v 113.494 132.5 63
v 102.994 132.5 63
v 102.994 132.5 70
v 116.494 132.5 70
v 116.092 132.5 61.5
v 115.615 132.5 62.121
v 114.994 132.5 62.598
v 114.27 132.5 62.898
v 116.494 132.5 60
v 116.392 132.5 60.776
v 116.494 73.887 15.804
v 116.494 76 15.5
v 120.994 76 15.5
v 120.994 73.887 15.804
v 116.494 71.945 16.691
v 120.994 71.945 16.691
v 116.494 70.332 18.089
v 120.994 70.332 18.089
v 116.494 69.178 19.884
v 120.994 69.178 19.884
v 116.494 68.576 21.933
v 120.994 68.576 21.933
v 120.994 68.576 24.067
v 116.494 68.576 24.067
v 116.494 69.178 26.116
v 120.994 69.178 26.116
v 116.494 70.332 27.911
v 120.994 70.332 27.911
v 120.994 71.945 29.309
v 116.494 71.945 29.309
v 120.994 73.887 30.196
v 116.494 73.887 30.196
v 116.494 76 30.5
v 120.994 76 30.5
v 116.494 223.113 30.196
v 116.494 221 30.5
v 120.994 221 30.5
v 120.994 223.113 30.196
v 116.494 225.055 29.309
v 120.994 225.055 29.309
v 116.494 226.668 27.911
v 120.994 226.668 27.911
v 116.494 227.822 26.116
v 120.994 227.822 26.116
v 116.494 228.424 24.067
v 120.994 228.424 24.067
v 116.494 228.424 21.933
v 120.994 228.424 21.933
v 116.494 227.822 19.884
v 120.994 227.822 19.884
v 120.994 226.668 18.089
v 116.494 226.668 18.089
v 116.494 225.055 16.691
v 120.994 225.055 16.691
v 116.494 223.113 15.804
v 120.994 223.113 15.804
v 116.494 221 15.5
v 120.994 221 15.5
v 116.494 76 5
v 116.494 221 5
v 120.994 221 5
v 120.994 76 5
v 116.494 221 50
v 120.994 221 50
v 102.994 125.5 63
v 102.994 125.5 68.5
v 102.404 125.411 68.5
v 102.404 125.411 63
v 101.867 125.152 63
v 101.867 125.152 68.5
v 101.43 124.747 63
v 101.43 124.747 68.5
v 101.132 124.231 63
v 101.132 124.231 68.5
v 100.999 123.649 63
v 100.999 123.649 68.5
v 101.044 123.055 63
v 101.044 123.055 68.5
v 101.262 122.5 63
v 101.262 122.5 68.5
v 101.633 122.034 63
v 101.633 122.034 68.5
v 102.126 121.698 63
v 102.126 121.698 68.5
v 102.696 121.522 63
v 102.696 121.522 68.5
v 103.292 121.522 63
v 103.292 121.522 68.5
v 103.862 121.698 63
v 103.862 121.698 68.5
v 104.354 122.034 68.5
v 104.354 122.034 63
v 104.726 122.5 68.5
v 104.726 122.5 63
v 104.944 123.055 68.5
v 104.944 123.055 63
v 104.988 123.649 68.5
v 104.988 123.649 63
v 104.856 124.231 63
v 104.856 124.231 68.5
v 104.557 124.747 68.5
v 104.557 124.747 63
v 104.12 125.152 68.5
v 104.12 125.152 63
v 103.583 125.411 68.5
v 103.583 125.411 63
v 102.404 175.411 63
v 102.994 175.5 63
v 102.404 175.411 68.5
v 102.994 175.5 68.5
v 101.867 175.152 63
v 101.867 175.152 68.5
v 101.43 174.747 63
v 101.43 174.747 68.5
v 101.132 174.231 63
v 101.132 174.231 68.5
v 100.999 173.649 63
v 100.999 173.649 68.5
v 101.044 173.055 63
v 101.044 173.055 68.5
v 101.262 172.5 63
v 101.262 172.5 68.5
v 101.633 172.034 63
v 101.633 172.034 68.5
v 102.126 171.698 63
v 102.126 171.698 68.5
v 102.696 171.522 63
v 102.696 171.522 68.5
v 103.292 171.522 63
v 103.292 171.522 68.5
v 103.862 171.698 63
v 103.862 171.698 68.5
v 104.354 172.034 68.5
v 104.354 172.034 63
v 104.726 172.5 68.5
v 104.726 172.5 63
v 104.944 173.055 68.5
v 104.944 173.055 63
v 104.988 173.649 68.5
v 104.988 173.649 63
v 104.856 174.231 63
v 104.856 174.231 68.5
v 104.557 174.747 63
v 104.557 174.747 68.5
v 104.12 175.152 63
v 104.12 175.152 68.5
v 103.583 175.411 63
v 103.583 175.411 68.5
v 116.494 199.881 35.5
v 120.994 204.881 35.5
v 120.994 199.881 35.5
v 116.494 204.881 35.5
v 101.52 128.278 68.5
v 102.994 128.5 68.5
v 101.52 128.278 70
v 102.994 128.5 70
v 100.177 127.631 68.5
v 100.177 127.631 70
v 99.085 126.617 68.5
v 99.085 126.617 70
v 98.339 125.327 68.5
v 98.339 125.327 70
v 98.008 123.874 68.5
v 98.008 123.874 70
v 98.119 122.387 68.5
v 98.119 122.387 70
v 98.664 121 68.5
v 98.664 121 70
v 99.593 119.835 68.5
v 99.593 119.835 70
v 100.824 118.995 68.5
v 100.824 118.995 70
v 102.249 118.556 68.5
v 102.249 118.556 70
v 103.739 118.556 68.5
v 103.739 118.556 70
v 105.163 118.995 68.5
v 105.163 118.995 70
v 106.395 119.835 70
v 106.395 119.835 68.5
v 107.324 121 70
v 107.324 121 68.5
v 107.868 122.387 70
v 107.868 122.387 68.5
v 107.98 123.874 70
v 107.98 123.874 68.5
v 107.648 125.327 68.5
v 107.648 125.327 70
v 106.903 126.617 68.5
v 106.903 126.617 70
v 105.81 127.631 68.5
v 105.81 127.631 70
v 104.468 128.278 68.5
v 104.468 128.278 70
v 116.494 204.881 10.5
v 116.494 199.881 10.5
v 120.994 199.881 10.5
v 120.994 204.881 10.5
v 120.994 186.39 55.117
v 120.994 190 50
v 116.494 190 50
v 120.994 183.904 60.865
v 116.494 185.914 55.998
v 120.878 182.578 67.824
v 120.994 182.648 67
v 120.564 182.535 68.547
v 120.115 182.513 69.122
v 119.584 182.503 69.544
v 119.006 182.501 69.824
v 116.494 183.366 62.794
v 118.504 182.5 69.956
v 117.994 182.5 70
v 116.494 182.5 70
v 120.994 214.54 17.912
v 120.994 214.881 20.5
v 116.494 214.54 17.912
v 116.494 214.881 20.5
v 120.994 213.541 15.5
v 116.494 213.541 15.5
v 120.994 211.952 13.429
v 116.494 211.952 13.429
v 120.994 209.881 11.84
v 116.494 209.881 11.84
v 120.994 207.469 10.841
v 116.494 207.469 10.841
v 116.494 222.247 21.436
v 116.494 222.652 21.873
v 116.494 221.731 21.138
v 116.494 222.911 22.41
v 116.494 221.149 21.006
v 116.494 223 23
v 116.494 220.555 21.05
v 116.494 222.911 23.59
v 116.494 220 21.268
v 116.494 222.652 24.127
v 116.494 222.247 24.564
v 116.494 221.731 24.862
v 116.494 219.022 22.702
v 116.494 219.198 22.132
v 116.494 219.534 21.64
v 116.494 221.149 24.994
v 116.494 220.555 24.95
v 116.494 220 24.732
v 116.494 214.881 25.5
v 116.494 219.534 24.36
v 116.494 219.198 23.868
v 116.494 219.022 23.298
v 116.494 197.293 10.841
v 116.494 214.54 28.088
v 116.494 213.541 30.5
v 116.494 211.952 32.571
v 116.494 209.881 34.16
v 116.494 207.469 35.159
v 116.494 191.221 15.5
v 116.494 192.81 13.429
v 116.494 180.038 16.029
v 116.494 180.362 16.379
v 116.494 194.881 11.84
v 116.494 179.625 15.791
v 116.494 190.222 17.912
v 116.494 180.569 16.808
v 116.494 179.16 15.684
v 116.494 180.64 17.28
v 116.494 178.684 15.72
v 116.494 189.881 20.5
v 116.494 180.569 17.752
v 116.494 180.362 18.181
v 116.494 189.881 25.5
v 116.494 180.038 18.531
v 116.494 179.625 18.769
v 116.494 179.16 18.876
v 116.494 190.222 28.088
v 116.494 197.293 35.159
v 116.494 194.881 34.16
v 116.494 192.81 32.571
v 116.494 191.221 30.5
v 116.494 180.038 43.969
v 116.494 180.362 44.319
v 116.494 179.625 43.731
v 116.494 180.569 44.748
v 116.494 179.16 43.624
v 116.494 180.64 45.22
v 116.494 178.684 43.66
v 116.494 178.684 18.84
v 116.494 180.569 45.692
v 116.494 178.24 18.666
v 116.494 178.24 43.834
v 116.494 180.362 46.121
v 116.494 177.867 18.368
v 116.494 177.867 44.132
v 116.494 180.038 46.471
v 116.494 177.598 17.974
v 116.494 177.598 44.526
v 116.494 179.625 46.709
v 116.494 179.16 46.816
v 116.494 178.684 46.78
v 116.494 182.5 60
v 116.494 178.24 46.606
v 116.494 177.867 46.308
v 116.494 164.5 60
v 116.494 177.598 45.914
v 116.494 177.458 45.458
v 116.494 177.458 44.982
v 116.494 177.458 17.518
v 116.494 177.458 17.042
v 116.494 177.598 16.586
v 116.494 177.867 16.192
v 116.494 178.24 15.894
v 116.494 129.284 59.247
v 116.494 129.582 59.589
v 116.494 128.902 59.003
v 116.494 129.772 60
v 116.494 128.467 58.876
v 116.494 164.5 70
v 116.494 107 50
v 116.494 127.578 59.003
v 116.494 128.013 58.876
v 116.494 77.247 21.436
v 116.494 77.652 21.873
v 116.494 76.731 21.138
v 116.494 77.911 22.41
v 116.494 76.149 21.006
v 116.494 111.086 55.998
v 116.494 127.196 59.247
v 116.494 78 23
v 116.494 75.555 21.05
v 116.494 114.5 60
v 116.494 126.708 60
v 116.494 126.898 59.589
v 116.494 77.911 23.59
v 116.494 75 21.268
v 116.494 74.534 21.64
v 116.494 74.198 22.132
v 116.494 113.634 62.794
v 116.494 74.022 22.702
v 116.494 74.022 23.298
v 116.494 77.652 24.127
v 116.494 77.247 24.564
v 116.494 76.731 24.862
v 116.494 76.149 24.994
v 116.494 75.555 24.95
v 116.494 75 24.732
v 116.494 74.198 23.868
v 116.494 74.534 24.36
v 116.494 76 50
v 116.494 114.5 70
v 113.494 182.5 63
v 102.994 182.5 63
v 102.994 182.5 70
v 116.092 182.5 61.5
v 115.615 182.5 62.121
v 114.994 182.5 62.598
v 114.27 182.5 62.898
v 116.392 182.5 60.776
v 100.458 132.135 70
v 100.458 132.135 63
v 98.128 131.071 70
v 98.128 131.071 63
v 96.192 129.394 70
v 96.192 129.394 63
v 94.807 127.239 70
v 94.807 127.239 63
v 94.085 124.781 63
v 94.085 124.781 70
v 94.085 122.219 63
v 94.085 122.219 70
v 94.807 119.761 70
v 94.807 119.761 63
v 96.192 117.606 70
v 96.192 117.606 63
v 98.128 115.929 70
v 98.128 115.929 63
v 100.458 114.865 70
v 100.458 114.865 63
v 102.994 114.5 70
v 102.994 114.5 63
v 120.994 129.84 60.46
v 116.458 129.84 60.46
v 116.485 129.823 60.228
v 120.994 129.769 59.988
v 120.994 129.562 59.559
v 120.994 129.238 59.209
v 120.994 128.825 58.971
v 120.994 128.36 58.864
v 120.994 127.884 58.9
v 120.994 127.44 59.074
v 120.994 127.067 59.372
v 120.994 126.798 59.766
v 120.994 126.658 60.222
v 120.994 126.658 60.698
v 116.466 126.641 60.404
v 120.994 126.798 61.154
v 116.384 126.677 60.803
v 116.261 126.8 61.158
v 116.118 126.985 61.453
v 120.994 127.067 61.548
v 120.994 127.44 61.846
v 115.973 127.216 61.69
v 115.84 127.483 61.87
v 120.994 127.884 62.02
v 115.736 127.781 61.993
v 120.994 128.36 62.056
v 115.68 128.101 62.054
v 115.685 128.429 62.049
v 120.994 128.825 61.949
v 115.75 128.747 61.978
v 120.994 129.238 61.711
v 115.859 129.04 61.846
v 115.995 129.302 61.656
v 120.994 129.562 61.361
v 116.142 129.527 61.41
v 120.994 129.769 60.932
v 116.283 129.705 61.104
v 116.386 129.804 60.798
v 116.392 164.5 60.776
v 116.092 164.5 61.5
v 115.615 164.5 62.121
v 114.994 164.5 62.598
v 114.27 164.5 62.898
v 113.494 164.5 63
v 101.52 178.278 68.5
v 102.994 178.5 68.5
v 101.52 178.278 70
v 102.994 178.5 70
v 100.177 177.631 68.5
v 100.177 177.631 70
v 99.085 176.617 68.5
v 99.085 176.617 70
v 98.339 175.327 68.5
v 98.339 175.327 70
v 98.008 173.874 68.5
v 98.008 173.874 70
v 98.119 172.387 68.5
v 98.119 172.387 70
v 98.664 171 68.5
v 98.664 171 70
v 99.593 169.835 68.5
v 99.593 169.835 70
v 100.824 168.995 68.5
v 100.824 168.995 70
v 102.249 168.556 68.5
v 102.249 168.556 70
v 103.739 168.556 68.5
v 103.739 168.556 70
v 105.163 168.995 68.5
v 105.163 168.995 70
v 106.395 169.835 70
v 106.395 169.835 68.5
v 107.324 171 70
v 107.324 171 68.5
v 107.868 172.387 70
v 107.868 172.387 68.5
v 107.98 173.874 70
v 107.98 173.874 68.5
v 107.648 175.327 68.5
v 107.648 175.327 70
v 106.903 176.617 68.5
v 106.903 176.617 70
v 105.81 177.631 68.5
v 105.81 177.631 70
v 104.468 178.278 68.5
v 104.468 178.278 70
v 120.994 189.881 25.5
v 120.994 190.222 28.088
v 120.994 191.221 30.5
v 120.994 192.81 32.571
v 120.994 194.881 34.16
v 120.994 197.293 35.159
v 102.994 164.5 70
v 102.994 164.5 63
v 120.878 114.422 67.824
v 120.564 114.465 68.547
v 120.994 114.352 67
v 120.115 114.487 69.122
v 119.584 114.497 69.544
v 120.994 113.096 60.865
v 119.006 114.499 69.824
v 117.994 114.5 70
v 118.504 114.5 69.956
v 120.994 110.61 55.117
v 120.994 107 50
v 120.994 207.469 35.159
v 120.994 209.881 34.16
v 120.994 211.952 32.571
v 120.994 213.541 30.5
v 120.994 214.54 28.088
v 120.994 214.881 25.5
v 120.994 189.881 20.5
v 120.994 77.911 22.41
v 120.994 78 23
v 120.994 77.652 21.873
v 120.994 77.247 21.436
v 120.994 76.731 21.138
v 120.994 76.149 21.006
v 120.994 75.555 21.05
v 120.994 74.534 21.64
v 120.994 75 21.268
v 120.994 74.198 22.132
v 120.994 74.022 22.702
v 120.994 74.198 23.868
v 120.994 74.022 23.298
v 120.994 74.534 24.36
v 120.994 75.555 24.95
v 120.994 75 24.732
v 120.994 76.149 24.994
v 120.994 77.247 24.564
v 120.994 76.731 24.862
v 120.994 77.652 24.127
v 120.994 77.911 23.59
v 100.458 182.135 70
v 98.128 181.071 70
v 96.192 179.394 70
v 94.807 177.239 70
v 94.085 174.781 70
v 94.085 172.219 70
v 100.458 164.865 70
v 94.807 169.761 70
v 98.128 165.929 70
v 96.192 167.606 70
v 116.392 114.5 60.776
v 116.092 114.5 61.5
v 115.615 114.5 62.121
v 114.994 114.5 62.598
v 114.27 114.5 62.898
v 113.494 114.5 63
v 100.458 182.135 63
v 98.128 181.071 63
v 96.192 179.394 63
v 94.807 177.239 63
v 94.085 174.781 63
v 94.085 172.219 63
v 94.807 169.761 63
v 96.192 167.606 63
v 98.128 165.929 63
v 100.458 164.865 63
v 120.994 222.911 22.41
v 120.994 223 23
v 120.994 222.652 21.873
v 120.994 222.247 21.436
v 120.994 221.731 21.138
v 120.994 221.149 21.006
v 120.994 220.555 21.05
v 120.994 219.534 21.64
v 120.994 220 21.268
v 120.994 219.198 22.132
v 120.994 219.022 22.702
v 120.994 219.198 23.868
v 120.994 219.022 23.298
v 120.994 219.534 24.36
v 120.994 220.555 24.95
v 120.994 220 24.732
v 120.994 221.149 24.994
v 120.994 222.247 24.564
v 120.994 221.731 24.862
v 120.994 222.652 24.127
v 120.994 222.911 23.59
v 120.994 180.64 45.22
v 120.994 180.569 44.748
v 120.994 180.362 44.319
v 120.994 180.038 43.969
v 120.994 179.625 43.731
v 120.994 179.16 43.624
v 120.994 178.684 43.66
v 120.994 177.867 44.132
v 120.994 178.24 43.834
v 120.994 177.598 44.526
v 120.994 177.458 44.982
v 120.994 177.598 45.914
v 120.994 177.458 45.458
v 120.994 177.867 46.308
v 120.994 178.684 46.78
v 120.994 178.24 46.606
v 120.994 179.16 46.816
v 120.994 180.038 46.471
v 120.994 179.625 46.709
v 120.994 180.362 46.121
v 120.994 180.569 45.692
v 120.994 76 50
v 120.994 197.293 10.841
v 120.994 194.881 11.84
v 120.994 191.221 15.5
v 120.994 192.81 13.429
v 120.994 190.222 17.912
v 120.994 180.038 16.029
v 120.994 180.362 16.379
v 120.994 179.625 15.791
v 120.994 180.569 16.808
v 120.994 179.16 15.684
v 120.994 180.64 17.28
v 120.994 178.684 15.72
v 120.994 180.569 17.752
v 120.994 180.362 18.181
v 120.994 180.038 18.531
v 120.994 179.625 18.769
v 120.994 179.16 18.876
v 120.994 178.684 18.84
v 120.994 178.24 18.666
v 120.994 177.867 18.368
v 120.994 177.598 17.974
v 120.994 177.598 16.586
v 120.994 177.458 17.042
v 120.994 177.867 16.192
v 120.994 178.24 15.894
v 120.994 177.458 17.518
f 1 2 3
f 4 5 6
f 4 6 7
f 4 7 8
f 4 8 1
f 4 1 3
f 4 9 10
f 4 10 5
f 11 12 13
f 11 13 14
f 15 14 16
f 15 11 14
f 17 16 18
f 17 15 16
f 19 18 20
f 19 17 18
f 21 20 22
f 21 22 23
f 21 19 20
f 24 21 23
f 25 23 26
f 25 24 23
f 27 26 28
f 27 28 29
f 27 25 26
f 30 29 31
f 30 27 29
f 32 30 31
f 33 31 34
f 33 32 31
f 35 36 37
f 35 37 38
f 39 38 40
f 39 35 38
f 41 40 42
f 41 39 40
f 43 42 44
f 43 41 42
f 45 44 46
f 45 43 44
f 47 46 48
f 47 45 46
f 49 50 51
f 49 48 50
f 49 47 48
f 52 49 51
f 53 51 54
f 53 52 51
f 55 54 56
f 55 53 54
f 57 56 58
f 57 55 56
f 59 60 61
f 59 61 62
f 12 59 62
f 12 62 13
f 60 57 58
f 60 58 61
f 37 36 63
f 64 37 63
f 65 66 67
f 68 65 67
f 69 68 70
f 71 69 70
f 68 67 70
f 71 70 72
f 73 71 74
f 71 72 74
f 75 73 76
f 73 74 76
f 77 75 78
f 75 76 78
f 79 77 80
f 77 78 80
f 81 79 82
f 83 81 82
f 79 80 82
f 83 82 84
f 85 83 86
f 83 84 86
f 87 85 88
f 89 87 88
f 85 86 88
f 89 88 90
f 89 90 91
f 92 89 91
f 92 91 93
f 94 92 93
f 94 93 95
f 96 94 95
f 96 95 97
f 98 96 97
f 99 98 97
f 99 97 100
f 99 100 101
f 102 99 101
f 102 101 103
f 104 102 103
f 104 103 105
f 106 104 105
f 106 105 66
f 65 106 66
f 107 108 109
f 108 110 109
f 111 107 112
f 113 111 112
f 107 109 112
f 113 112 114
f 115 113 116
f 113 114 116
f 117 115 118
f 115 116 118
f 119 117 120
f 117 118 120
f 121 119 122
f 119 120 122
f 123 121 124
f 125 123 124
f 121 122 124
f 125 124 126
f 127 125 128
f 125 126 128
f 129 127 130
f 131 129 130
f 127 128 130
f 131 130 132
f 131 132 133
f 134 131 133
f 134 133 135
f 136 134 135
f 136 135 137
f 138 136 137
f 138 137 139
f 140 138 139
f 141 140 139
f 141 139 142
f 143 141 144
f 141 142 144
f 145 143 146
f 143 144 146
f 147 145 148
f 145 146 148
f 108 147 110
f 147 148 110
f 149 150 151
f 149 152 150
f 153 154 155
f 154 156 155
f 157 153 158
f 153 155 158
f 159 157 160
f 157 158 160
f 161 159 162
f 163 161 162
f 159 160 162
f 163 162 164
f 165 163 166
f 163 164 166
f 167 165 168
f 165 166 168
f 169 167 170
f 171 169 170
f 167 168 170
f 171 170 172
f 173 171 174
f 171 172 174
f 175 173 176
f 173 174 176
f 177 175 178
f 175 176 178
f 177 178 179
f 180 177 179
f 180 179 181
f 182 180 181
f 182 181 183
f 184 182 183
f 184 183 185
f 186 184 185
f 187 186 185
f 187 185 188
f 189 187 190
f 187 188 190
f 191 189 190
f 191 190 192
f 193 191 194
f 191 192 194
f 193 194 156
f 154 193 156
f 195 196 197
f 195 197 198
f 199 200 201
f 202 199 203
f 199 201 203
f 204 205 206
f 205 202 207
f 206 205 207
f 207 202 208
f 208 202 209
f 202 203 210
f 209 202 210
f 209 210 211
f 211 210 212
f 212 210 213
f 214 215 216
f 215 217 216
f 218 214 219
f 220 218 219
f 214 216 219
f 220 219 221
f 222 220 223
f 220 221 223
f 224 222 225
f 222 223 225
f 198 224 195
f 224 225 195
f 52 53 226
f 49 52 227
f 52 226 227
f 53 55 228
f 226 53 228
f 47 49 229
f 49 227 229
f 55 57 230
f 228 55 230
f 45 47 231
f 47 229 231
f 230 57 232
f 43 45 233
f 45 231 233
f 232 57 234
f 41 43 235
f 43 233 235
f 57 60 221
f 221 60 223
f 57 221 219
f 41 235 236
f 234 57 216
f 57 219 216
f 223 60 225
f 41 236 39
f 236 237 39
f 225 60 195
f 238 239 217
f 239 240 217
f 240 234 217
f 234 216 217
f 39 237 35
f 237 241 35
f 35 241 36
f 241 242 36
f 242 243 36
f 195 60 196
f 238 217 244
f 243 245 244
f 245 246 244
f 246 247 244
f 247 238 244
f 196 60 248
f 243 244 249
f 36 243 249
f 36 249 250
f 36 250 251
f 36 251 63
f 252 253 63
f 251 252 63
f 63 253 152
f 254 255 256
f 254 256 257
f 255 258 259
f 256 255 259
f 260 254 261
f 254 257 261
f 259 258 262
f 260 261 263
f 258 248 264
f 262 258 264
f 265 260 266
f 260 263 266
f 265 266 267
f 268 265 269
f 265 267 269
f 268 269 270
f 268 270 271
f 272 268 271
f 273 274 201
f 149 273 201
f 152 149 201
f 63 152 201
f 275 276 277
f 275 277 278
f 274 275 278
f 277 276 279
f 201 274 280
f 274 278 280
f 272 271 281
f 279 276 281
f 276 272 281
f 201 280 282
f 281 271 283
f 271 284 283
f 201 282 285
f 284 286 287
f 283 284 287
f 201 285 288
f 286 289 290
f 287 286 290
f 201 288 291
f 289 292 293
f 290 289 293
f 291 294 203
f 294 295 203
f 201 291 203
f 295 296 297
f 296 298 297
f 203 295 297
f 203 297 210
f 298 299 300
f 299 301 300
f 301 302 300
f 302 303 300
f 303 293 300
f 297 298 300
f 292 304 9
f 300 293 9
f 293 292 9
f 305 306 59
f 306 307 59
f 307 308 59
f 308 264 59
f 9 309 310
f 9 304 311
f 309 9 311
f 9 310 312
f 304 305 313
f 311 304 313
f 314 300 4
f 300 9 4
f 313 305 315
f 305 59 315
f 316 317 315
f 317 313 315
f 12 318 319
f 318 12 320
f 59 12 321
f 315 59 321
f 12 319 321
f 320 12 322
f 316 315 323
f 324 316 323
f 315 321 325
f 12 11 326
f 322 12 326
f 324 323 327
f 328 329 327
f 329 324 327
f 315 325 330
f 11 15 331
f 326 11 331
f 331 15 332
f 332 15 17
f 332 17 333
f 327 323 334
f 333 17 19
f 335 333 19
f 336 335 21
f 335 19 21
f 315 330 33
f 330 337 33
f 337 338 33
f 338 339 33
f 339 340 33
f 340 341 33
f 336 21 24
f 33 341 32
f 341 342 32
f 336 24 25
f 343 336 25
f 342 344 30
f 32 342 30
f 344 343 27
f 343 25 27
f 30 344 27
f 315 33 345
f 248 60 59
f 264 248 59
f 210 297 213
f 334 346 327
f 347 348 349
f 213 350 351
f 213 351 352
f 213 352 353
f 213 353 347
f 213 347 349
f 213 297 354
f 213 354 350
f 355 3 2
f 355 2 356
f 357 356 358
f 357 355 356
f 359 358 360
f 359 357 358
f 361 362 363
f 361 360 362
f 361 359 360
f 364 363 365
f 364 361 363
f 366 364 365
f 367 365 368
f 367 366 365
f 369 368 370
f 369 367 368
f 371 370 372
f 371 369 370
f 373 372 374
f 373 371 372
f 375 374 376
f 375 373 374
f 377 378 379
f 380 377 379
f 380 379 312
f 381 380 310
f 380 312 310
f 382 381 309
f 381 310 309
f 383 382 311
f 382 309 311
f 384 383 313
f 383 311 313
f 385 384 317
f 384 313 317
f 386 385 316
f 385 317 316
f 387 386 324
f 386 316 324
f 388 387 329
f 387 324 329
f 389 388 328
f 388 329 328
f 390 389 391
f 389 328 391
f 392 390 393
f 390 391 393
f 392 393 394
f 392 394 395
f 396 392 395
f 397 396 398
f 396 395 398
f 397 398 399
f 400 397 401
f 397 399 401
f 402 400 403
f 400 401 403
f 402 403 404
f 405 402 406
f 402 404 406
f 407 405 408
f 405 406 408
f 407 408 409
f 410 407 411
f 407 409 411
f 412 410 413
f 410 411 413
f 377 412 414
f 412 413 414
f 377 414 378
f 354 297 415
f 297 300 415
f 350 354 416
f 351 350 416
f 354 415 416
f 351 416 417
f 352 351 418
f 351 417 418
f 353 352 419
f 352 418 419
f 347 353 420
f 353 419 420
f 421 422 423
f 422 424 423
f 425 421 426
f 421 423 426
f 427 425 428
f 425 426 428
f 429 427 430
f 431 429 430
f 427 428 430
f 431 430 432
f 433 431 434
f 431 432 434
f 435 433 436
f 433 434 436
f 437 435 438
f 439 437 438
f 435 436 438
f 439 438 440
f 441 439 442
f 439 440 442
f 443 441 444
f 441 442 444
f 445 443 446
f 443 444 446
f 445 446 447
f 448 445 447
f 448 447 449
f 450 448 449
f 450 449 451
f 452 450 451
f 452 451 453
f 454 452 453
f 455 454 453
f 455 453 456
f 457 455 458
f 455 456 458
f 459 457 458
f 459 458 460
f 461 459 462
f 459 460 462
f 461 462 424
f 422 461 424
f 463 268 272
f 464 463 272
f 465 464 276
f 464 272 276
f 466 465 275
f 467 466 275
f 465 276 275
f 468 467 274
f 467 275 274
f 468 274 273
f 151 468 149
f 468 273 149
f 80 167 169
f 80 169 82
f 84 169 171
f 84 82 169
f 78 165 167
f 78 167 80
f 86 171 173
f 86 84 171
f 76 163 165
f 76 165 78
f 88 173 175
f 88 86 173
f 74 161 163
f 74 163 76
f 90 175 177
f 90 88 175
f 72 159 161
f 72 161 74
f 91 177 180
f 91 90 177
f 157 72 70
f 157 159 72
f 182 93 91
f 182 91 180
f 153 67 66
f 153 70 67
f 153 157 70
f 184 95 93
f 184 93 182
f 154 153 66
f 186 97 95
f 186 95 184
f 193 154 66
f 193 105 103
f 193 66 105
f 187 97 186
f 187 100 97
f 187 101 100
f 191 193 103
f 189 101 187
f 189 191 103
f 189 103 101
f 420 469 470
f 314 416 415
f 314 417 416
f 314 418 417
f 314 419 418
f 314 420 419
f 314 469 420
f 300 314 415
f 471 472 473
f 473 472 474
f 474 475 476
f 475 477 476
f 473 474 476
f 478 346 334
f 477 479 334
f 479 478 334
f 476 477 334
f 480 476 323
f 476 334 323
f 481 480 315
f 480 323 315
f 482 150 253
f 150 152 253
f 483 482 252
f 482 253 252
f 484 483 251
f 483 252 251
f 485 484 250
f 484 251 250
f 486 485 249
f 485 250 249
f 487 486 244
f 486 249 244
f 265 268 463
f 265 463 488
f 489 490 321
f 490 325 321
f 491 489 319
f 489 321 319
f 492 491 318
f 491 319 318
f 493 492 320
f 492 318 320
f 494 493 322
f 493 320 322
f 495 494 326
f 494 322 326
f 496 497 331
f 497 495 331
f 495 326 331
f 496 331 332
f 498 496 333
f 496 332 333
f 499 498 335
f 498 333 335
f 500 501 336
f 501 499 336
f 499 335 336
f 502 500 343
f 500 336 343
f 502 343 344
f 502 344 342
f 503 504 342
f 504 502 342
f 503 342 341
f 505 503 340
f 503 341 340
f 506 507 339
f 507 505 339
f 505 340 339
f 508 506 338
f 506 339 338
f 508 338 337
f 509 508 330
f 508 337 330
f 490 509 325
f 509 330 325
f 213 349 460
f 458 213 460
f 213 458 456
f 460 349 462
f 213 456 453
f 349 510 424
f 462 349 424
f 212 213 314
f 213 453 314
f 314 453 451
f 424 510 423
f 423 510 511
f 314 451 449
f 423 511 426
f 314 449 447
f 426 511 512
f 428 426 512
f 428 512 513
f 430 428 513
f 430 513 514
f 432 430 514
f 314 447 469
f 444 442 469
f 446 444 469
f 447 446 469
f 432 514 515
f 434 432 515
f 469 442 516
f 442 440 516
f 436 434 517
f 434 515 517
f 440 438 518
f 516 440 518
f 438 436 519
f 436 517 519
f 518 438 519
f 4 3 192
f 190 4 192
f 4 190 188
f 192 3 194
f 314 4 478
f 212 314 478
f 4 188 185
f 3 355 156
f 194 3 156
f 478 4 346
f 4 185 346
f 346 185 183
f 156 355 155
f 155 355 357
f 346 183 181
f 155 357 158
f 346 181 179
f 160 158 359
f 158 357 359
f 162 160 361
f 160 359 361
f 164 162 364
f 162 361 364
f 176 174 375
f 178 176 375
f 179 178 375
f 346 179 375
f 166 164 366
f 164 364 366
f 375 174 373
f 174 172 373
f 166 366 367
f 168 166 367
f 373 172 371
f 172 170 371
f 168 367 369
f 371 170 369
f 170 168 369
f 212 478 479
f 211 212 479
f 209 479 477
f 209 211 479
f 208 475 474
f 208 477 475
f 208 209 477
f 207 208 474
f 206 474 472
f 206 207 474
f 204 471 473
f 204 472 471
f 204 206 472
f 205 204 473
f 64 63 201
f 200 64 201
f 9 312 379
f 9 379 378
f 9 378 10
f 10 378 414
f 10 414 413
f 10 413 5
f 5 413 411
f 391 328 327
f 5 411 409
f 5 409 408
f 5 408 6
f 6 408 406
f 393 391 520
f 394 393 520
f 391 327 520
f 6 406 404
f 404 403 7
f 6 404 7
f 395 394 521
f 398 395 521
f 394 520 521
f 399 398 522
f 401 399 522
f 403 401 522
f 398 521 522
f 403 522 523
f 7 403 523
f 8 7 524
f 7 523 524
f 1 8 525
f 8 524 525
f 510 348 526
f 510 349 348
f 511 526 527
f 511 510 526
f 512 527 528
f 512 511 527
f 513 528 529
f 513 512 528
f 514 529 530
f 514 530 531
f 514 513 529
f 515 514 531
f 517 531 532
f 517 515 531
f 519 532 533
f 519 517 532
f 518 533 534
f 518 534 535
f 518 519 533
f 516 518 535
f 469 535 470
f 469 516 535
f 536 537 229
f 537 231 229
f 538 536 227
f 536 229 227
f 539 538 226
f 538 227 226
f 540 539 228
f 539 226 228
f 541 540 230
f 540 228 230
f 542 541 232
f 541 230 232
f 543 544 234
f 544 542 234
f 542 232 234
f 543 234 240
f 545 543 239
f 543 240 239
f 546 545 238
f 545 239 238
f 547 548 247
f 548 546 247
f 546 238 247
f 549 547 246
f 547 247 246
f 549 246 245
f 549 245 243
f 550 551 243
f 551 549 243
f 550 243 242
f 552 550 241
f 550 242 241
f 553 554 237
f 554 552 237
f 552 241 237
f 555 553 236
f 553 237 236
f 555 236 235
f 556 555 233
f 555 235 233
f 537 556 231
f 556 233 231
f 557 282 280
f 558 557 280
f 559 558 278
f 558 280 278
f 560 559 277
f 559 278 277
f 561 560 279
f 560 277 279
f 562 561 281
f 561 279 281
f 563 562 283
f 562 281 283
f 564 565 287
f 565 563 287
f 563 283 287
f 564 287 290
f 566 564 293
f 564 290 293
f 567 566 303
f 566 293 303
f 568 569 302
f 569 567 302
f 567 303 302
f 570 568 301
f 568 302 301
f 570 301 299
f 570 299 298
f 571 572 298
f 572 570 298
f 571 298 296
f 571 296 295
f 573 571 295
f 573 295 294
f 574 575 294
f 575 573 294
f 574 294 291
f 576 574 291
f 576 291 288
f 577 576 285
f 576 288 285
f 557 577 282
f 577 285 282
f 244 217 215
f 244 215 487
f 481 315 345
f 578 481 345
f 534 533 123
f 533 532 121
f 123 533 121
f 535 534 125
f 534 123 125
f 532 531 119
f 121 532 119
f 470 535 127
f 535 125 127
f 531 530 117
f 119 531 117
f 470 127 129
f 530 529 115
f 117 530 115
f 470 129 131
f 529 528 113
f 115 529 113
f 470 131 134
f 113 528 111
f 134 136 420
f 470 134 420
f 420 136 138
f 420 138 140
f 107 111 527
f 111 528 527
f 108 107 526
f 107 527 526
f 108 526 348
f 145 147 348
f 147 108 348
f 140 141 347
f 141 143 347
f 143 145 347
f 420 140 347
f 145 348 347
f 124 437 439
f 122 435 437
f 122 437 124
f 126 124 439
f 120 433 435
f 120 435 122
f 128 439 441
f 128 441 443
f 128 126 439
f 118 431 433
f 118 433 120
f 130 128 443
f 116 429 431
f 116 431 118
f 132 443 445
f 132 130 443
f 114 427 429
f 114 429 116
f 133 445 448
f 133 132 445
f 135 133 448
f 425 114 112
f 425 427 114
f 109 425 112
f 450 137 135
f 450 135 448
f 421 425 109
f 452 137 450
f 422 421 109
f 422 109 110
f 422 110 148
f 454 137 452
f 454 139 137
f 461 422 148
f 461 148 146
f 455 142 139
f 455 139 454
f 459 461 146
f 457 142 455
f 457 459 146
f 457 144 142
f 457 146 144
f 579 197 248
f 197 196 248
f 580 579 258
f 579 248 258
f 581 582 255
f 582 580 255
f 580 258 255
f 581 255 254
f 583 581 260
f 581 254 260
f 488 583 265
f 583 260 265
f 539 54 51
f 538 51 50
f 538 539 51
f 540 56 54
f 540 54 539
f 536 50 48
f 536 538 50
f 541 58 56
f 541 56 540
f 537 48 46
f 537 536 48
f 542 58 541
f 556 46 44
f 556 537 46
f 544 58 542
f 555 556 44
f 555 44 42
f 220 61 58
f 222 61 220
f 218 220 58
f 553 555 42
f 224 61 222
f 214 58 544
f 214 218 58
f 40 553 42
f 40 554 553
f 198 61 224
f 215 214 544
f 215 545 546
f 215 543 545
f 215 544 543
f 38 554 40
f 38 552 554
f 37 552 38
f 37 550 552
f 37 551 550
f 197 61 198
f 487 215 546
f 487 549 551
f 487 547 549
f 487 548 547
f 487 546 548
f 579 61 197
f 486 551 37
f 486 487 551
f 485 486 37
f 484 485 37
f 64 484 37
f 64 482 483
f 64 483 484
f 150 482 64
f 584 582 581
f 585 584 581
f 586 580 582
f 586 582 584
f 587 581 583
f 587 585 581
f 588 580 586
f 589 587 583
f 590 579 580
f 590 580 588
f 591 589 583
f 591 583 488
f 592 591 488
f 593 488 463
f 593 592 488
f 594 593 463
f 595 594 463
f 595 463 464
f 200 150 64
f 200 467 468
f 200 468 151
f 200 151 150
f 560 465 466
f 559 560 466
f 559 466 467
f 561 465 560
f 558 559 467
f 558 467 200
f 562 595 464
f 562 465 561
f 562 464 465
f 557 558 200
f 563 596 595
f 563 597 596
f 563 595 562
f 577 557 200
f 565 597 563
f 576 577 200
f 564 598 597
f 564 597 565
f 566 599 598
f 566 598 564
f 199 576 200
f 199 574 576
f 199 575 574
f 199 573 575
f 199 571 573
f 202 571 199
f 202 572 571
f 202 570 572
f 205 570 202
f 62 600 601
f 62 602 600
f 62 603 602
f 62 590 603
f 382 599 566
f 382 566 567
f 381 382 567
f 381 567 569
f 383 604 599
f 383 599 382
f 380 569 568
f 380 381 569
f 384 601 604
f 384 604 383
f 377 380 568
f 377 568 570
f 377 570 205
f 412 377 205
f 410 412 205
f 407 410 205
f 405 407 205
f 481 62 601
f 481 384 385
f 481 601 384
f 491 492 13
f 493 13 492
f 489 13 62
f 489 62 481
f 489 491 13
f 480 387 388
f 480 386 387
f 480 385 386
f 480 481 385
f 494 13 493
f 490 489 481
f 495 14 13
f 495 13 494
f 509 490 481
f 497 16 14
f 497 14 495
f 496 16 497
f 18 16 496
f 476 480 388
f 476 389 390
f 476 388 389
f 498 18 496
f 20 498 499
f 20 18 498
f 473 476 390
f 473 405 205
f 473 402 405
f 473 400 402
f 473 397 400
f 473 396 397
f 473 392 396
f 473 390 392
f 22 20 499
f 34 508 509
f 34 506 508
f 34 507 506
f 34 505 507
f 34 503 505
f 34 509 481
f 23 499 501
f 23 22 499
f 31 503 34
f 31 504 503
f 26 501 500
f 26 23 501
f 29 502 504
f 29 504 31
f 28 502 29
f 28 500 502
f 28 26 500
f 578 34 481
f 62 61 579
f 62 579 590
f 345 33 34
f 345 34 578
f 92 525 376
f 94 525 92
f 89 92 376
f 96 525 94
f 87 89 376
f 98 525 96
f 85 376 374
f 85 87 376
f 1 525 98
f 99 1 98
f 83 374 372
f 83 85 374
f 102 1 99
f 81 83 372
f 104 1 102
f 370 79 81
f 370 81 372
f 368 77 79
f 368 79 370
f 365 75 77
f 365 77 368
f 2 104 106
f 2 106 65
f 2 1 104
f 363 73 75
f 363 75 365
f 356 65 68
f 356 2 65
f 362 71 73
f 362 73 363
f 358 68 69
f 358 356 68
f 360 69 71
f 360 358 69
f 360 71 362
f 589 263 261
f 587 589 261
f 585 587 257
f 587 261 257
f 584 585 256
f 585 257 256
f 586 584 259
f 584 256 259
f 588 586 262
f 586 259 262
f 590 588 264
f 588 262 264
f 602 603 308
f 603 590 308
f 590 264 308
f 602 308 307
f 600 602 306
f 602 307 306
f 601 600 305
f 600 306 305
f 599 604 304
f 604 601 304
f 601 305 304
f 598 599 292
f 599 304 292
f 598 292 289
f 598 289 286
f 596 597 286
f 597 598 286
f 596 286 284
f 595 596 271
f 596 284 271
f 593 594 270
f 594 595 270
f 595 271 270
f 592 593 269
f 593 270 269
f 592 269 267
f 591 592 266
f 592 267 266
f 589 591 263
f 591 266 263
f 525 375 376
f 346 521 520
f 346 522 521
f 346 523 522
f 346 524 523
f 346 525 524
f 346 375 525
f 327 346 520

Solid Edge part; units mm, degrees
extrude "Protrusion1" [suppressed]
sketch "Sketch1" plane through (116.4938, 148.5, 37.25) normal (1, 0, 0) x (0, 1, 0)
  line L0 (72.5, -6.75) -> (72.5, 12.75)
  line L1 (72.5, 12.75) -> (41.5, 12.75)
  arc A0 (34, 32.75) -> (41.5, 12.75) centre (64.4167, 32.75) ccw
  line L2 (0, 32.75) -> (34, 32.75)
  line L3 (0, 32.75) -> (-34, 32.75)
  arc A1 (-34, 32.75) -> (-41.5, 12.75) centre (-64.4167, 32.75) cw
  line L4 (-41.5, 12.75) -> (-72.5, 12.75)
  line L5 (-72.5, -6.75) -> (-72.5, 12.75)
  arc A2 (-72.5, -21.75) -> (-72.5, -6.75) centre (-72.5, -14.25) cw
  line L6 (-72.5, -32.25) -> (-72.5, -21.75)
  line L7 (72.5, -32.25) -> (-72.5, -32.25)
  line L8 (72.5, -21.75) -> (72.5, -32.25)
  arc A3 (72.5, -21.75) -> (72.5, -6.75) centre (72.5, -14.25) ccw
  circle A4 centre (72.5, -14.25) radius 2
  circle A5 centre (-72.5, -14.25) radius 2
  circle A6 centre (-20.26, 23.21) radius 1.6
  circle A7 centre (30.54, 7.97) radius 1.6
  circle A8 centre (30.54, -19.97) radius 1.6
  line L9 (66.3808, -16.75) -> (66.3808, -11.75)
  arc A9 (56.3808, -1.75) -> (66.3808, -11.75) centre (56.3808, -11.75) cw
  line L10 (56.3808, -1.75) -> (51.3808, -1.75)
  arc A10 (41.3808, -11.75) -> (51.3808, -1.75) centre (51.3808, -11.75) cw
  line L11 (41.3808, -11.75) -> (41.3808, -16.75)
  arc A11 (41.3808, -16.75) -> (51.3808, -26.75) centre (51.3808, -16.75) ccw
  line L12 (51.3808, -26.75) -> (56.3808, -26.75)
  arc A12 (66.3808, -16.75) -> (56.3808, -26.75) centre (56.3808, -16.75) cw
extrude "Protrusion2" add sketch "Sketch1" along normal blind 4.5
sketch "Sketch2" plane through (106.8492, 148.5, 70) normal (0, 0, 1) x (0, 1, 0)
  circle A0 centre (-25, 3.8554) radius 2
  line L0 (-16, 3.8554) -> (-16, -9.6446)
  line L1 (-34, -9.6446) -> (-16, -9.6446)
  line L2 (-34, 3.8554) -> (-34, -9.6446)
  arc A1 (-34, 3.8554) -> (-16, 3.8554) centre (-25, 3.8554) cw
  circle A2 centre (25, 3.8554) radius 2
  line L3 (16, 3.8554) -> (16, -9.6446)
  line L4 (16, -9.6446) -> (34, -9.6446)
  line L5 (34, 3.8554) -> (34, -9.6446)
  arc A3 (34, 3.8554) -> (16, 3.8554) centre (25, 3.8554) ccw
extrude "ProtrusiónExtruida_24" add sketch "Sketch2" against normal blind 7
fillet "Redondeo_4" radius 3 5 edges at (116.4938, 173.5, 63) (116.4938, 123.5, 63) (116.4938, 173.5, 63) (116.4938, 123.5, 63) (120.9938, 148.5, 70)
fillet "Redondeo_5" [suppressed]
sketch "Sketch3" plane through (108.6188, 148.5, 70) normal (0, 0, 1) x (0, 1, 0)
  circle A0 centre (-25, 5.625) radius 5
  circle A1 centre (25, 5.625) radius 5
extrude "VaciadoExtruido_57" cut sketch "Sketch3" along normal mid plane 3
